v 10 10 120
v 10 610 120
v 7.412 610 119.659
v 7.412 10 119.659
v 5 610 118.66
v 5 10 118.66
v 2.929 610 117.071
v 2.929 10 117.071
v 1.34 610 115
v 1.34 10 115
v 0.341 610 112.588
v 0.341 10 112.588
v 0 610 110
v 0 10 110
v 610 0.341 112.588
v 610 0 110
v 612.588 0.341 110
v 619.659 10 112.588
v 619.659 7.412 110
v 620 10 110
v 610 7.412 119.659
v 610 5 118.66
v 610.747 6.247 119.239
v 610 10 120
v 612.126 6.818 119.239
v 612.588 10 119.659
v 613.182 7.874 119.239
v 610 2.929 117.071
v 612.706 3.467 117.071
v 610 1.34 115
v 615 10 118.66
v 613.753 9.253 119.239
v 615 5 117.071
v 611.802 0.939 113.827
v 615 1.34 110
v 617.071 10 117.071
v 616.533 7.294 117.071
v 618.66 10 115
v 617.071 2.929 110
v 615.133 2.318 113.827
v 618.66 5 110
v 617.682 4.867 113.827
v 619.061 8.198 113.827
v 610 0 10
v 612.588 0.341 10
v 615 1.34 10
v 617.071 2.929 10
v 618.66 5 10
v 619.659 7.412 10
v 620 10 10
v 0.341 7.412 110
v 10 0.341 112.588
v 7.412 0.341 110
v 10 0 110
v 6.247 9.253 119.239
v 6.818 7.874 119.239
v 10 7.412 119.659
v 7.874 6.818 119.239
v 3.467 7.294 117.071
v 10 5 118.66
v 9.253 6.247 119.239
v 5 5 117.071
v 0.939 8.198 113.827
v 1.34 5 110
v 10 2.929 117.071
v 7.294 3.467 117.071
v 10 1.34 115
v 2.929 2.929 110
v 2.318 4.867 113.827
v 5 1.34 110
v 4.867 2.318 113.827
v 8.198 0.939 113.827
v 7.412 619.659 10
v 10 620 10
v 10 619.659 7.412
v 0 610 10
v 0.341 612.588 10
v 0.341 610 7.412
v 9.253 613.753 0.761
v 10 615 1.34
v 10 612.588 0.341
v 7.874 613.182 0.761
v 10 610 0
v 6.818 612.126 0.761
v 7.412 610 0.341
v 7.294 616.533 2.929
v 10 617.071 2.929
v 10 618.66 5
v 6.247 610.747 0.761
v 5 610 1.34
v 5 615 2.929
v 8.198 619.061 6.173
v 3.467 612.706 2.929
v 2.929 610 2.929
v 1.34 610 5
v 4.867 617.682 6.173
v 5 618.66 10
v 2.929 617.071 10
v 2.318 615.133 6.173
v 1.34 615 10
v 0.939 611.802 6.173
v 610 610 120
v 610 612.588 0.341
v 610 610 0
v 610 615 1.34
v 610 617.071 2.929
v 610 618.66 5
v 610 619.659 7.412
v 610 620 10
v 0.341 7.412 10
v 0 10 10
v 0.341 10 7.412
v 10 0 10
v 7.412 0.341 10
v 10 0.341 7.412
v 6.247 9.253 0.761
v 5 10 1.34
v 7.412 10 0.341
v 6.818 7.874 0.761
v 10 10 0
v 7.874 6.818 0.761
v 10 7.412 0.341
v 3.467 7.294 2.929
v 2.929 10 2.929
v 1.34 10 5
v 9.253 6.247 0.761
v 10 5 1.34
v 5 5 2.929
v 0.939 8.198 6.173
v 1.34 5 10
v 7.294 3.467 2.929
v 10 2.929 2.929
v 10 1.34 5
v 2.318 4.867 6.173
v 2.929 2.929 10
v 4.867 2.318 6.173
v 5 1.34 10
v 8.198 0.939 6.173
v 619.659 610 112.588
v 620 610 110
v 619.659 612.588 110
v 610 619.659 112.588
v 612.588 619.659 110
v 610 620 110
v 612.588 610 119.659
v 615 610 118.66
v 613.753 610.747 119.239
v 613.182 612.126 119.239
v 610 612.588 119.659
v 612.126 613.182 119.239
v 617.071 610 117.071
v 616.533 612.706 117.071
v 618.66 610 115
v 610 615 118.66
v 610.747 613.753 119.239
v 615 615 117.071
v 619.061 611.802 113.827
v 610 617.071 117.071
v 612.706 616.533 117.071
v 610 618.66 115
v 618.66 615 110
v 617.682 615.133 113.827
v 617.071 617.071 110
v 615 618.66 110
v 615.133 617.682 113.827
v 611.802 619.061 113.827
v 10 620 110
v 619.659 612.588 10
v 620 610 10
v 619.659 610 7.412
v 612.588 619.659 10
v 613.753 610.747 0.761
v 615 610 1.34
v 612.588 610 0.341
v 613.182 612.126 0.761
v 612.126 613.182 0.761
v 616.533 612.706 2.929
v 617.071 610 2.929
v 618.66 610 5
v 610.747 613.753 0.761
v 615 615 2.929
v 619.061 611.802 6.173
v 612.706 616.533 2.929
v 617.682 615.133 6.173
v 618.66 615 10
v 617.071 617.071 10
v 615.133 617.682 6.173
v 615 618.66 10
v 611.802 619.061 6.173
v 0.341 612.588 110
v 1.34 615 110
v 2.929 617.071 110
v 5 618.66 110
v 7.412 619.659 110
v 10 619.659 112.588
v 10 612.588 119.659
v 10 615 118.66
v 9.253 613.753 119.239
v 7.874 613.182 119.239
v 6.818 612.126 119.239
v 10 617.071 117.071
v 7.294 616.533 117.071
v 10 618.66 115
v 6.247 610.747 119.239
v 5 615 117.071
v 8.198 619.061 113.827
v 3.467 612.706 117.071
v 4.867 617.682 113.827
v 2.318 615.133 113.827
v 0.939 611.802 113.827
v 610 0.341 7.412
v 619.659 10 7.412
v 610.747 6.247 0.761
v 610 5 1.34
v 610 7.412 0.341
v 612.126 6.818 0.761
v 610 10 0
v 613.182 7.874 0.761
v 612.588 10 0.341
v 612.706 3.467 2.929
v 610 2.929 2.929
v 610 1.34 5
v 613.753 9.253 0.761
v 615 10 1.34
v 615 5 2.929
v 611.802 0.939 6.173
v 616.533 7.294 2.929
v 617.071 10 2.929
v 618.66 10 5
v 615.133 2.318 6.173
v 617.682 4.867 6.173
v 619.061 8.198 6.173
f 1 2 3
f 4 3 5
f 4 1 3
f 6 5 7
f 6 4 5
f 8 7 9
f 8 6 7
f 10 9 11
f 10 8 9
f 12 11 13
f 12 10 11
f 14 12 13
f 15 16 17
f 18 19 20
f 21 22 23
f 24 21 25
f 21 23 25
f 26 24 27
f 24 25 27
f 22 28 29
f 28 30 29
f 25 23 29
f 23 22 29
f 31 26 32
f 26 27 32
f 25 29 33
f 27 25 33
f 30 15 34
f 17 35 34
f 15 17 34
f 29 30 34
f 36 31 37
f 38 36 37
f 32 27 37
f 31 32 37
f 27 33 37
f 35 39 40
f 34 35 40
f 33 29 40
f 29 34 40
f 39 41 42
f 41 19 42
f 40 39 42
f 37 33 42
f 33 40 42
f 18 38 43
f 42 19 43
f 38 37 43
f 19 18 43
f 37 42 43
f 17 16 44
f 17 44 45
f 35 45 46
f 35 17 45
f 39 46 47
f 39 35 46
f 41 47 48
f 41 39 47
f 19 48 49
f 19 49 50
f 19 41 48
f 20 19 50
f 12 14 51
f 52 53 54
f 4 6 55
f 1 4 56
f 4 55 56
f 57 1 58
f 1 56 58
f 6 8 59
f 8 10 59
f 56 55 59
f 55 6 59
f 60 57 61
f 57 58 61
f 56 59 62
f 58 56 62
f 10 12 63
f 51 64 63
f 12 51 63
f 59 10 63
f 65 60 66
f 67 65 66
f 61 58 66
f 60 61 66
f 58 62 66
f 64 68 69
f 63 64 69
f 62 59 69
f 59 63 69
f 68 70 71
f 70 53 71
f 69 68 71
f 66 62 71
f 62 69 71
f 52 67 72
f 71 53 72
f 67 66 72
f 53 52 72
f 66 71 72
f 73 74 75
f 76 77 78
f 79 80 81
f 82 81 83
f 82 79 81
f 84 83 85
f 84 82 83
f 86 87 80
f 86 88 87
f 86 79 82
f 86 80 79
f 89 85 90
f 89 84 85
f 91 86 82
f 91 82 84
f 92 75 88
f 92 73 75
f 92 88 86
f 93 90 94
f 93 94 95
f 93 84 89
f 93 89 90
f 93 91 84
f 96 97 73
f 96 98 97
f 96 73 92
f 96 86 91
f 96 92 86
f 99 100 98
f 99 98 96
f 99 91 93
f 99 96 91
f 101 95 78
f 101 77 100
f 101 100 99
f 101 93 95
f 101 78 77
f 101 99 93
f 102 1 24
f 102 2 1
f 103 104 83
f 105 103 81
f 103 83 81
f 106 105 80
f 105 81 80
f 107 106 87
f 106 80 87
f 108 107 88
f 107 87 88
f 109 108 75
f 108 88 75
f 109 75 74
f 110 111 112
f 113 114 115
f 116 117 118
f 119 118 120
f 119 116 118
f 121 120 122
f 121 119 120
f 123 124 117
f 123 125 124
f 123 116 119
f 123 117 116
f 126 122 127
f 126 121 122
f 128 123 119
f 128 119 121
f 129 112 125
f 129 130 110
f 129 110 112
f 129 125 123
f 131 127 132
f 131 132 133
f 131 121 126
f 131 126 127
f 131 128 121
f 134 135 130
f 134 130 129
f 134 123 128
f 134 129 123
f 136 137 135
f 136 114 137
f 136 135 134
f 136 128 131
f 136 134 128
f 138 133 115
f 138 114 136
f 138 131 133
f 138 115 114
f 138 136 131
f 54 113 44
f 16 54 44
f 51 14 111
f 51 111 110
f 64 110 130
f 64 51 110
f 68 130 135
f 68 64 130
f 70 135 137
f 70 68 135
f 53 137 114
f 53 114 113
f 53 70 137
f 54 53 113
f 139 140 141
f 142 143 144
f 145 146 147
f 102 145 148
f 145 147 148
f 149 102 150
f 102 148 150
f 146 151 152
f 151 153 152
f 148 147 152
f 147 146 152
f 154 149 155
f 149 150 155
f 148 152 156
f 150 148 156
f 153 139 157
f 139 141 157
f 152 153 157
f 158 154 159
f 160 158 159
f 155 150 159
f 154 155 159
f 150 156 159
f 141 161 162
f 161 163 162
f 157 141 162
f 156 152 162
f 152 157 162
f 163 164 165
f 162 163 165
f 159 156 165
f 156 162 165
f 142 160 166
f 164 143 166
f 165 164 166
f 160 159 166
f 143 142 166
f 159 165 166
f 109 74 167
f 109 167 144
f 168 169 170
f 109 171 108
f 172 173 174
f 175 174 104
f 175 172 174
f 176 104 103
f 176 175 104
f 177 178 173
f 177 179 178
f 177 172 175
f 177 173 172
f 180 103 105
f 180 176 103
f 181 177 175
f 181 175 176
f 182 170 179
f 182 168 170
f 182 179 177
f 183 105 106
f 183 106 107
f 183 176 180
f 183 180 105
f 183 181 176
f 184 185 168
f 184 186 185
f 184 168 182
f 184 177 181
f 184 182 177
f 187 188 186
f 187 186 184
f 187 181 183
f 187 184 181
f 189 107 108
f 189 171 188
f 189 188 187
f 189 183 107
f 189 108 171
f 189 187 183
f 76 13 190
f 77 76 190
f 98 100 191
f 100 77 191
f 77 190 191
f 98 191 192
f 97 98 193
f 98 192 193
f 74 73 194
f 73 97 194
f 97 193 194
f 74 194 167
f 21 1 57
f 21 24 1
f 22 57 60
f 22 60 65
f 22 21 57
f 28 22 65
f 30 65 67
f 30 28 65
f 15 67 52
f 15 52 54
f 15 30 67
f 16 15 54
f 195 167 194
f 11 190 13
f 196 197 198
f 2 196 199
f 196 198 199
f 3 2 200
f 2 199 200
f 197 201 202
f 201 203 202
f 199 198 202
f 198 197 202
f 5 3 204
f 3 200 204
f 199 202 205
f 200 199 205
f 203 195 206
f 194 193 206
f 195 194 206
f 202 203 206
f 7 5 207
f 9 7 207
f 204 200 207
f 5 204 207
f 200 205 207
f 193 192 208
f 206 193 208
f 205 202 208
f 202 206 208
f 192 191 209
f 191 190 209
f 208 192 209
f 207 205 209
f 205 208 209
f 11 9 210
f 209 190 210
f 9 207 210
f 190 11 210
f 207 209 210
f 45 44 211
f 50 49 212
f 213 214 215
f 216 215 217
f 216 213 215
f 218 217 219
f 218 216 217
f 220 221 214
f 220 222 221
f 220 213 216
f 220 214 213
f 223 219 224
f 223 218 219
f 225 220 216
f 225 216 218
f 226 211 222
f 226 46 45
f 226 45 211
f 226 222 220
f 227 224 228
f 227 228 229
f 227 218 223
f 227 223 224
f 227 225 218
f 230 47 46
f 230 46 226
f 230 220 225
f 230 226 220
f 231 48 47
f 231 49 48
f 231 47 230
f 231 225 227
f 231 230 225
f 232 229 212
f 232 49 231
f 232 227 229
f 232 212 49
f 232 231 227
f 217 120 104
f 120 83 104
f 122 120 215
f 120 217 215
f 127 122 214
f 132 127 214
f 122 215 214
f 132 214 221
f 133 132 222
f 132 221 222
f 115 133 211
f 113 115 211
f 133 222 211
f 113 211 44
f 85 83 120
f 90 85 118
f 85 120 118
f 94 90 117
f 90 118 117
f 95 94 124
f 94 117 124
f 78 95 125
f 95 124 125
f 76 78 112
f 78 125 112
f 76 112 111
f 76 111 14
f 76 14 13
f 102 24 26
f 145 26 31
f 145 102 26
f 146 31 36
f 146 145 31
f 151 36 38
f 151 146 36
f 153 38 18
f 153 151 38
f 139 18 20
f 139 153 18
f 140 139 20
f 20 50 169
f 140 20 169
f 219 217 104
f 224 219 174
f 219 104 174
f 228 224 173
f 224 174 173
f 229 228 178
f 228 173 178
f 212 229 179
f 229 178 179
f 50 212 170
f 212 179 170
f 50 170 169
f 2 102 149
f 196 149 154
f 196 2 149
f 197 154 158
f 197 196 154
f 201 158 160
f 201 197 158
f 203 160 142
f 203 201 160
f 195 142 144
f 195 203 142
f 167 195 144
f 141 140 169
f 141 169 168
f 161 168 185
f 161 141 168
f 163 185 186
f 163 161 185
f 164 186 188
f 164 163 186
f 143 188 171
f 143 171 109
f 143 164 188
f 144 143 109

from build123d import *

# Parameters (mm, degrees)
F0_W     = 620
F0_H     = 620
F1_DEPTH = 120
F2_R     = 10
F3_R     = 10


with BuildPart() as f1:
    # F0 (on Top) → F1 (new body)
    with BuildSketch(Plane.XY):
        with Locations((310, 310)):
            Rectangle(F0_W, F0_H)
    extrude(amount=F1_DEPTH)

    # F2
    f2_edges = [f1.edges().sort_by_distance(p)[0] for p in [
        (620, 0, 60),
        (620, 620, 60),
        (0, 0, 60),
        (0, 620, 60),
    ]]
    fillet(f2_edges, radius=F2_R)

    # F3
    f3_edges = [f1.edges().sort_by_distance(p)[0] for p in [
        (310, 0, 120),
        (310, 0, 0),
    ]]
    fillet(f3_edges, radius=F3_R)


solid = f1.part
